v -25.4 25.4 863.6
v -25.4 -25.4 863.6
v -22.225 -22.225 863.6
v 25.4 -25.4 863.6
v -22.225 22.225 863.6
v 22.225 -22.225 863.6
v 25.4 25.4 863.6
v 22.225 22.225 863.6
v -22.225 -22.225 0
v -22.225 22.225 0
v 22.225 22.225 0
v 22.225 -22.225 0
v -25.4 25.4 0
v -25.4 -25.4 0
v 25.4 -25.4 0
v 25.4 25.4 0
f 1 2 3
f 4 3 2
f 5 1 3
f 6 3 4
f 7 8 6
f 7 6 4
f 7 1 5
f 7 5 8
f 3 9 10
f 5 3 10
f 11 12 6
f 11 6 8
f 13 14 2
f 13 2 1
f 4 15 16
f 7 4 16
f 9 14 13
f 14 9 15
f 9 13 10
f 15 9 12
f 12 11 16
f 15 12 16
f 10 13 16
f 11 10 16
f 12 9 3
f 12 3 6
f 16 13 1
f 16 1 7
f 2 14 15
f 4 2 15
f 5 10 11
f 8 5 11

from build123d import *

# Parameters (mm, degrees)
SKETCH1_W           = 50.8
SKETCH1_H           = 50.8
BOSS_EXTRUDE1_DEPTH = 863.6
SHELL1_T            = -3.175


with BuildPart() as part:
    # Sketch1 → Boss-Extrude1 (new body)
    with BuildSketch(Plane.XY):
        Rectangle(SKETCH1_W, SKETCH1_H)
    extrude(amount=BOSS_EXTRUDE1_DEPTH)

    # Shell1
    shell1_openings = [part.faces().sort_by_distance(p)[0] for p in [
        (0, 0, 863.6),
        (0, 0, 0),
    ]]
    offset(amount=SHELL1_T, openings=shell1_openings, kind=Kind.INTERSECTION)


solid = part.part
